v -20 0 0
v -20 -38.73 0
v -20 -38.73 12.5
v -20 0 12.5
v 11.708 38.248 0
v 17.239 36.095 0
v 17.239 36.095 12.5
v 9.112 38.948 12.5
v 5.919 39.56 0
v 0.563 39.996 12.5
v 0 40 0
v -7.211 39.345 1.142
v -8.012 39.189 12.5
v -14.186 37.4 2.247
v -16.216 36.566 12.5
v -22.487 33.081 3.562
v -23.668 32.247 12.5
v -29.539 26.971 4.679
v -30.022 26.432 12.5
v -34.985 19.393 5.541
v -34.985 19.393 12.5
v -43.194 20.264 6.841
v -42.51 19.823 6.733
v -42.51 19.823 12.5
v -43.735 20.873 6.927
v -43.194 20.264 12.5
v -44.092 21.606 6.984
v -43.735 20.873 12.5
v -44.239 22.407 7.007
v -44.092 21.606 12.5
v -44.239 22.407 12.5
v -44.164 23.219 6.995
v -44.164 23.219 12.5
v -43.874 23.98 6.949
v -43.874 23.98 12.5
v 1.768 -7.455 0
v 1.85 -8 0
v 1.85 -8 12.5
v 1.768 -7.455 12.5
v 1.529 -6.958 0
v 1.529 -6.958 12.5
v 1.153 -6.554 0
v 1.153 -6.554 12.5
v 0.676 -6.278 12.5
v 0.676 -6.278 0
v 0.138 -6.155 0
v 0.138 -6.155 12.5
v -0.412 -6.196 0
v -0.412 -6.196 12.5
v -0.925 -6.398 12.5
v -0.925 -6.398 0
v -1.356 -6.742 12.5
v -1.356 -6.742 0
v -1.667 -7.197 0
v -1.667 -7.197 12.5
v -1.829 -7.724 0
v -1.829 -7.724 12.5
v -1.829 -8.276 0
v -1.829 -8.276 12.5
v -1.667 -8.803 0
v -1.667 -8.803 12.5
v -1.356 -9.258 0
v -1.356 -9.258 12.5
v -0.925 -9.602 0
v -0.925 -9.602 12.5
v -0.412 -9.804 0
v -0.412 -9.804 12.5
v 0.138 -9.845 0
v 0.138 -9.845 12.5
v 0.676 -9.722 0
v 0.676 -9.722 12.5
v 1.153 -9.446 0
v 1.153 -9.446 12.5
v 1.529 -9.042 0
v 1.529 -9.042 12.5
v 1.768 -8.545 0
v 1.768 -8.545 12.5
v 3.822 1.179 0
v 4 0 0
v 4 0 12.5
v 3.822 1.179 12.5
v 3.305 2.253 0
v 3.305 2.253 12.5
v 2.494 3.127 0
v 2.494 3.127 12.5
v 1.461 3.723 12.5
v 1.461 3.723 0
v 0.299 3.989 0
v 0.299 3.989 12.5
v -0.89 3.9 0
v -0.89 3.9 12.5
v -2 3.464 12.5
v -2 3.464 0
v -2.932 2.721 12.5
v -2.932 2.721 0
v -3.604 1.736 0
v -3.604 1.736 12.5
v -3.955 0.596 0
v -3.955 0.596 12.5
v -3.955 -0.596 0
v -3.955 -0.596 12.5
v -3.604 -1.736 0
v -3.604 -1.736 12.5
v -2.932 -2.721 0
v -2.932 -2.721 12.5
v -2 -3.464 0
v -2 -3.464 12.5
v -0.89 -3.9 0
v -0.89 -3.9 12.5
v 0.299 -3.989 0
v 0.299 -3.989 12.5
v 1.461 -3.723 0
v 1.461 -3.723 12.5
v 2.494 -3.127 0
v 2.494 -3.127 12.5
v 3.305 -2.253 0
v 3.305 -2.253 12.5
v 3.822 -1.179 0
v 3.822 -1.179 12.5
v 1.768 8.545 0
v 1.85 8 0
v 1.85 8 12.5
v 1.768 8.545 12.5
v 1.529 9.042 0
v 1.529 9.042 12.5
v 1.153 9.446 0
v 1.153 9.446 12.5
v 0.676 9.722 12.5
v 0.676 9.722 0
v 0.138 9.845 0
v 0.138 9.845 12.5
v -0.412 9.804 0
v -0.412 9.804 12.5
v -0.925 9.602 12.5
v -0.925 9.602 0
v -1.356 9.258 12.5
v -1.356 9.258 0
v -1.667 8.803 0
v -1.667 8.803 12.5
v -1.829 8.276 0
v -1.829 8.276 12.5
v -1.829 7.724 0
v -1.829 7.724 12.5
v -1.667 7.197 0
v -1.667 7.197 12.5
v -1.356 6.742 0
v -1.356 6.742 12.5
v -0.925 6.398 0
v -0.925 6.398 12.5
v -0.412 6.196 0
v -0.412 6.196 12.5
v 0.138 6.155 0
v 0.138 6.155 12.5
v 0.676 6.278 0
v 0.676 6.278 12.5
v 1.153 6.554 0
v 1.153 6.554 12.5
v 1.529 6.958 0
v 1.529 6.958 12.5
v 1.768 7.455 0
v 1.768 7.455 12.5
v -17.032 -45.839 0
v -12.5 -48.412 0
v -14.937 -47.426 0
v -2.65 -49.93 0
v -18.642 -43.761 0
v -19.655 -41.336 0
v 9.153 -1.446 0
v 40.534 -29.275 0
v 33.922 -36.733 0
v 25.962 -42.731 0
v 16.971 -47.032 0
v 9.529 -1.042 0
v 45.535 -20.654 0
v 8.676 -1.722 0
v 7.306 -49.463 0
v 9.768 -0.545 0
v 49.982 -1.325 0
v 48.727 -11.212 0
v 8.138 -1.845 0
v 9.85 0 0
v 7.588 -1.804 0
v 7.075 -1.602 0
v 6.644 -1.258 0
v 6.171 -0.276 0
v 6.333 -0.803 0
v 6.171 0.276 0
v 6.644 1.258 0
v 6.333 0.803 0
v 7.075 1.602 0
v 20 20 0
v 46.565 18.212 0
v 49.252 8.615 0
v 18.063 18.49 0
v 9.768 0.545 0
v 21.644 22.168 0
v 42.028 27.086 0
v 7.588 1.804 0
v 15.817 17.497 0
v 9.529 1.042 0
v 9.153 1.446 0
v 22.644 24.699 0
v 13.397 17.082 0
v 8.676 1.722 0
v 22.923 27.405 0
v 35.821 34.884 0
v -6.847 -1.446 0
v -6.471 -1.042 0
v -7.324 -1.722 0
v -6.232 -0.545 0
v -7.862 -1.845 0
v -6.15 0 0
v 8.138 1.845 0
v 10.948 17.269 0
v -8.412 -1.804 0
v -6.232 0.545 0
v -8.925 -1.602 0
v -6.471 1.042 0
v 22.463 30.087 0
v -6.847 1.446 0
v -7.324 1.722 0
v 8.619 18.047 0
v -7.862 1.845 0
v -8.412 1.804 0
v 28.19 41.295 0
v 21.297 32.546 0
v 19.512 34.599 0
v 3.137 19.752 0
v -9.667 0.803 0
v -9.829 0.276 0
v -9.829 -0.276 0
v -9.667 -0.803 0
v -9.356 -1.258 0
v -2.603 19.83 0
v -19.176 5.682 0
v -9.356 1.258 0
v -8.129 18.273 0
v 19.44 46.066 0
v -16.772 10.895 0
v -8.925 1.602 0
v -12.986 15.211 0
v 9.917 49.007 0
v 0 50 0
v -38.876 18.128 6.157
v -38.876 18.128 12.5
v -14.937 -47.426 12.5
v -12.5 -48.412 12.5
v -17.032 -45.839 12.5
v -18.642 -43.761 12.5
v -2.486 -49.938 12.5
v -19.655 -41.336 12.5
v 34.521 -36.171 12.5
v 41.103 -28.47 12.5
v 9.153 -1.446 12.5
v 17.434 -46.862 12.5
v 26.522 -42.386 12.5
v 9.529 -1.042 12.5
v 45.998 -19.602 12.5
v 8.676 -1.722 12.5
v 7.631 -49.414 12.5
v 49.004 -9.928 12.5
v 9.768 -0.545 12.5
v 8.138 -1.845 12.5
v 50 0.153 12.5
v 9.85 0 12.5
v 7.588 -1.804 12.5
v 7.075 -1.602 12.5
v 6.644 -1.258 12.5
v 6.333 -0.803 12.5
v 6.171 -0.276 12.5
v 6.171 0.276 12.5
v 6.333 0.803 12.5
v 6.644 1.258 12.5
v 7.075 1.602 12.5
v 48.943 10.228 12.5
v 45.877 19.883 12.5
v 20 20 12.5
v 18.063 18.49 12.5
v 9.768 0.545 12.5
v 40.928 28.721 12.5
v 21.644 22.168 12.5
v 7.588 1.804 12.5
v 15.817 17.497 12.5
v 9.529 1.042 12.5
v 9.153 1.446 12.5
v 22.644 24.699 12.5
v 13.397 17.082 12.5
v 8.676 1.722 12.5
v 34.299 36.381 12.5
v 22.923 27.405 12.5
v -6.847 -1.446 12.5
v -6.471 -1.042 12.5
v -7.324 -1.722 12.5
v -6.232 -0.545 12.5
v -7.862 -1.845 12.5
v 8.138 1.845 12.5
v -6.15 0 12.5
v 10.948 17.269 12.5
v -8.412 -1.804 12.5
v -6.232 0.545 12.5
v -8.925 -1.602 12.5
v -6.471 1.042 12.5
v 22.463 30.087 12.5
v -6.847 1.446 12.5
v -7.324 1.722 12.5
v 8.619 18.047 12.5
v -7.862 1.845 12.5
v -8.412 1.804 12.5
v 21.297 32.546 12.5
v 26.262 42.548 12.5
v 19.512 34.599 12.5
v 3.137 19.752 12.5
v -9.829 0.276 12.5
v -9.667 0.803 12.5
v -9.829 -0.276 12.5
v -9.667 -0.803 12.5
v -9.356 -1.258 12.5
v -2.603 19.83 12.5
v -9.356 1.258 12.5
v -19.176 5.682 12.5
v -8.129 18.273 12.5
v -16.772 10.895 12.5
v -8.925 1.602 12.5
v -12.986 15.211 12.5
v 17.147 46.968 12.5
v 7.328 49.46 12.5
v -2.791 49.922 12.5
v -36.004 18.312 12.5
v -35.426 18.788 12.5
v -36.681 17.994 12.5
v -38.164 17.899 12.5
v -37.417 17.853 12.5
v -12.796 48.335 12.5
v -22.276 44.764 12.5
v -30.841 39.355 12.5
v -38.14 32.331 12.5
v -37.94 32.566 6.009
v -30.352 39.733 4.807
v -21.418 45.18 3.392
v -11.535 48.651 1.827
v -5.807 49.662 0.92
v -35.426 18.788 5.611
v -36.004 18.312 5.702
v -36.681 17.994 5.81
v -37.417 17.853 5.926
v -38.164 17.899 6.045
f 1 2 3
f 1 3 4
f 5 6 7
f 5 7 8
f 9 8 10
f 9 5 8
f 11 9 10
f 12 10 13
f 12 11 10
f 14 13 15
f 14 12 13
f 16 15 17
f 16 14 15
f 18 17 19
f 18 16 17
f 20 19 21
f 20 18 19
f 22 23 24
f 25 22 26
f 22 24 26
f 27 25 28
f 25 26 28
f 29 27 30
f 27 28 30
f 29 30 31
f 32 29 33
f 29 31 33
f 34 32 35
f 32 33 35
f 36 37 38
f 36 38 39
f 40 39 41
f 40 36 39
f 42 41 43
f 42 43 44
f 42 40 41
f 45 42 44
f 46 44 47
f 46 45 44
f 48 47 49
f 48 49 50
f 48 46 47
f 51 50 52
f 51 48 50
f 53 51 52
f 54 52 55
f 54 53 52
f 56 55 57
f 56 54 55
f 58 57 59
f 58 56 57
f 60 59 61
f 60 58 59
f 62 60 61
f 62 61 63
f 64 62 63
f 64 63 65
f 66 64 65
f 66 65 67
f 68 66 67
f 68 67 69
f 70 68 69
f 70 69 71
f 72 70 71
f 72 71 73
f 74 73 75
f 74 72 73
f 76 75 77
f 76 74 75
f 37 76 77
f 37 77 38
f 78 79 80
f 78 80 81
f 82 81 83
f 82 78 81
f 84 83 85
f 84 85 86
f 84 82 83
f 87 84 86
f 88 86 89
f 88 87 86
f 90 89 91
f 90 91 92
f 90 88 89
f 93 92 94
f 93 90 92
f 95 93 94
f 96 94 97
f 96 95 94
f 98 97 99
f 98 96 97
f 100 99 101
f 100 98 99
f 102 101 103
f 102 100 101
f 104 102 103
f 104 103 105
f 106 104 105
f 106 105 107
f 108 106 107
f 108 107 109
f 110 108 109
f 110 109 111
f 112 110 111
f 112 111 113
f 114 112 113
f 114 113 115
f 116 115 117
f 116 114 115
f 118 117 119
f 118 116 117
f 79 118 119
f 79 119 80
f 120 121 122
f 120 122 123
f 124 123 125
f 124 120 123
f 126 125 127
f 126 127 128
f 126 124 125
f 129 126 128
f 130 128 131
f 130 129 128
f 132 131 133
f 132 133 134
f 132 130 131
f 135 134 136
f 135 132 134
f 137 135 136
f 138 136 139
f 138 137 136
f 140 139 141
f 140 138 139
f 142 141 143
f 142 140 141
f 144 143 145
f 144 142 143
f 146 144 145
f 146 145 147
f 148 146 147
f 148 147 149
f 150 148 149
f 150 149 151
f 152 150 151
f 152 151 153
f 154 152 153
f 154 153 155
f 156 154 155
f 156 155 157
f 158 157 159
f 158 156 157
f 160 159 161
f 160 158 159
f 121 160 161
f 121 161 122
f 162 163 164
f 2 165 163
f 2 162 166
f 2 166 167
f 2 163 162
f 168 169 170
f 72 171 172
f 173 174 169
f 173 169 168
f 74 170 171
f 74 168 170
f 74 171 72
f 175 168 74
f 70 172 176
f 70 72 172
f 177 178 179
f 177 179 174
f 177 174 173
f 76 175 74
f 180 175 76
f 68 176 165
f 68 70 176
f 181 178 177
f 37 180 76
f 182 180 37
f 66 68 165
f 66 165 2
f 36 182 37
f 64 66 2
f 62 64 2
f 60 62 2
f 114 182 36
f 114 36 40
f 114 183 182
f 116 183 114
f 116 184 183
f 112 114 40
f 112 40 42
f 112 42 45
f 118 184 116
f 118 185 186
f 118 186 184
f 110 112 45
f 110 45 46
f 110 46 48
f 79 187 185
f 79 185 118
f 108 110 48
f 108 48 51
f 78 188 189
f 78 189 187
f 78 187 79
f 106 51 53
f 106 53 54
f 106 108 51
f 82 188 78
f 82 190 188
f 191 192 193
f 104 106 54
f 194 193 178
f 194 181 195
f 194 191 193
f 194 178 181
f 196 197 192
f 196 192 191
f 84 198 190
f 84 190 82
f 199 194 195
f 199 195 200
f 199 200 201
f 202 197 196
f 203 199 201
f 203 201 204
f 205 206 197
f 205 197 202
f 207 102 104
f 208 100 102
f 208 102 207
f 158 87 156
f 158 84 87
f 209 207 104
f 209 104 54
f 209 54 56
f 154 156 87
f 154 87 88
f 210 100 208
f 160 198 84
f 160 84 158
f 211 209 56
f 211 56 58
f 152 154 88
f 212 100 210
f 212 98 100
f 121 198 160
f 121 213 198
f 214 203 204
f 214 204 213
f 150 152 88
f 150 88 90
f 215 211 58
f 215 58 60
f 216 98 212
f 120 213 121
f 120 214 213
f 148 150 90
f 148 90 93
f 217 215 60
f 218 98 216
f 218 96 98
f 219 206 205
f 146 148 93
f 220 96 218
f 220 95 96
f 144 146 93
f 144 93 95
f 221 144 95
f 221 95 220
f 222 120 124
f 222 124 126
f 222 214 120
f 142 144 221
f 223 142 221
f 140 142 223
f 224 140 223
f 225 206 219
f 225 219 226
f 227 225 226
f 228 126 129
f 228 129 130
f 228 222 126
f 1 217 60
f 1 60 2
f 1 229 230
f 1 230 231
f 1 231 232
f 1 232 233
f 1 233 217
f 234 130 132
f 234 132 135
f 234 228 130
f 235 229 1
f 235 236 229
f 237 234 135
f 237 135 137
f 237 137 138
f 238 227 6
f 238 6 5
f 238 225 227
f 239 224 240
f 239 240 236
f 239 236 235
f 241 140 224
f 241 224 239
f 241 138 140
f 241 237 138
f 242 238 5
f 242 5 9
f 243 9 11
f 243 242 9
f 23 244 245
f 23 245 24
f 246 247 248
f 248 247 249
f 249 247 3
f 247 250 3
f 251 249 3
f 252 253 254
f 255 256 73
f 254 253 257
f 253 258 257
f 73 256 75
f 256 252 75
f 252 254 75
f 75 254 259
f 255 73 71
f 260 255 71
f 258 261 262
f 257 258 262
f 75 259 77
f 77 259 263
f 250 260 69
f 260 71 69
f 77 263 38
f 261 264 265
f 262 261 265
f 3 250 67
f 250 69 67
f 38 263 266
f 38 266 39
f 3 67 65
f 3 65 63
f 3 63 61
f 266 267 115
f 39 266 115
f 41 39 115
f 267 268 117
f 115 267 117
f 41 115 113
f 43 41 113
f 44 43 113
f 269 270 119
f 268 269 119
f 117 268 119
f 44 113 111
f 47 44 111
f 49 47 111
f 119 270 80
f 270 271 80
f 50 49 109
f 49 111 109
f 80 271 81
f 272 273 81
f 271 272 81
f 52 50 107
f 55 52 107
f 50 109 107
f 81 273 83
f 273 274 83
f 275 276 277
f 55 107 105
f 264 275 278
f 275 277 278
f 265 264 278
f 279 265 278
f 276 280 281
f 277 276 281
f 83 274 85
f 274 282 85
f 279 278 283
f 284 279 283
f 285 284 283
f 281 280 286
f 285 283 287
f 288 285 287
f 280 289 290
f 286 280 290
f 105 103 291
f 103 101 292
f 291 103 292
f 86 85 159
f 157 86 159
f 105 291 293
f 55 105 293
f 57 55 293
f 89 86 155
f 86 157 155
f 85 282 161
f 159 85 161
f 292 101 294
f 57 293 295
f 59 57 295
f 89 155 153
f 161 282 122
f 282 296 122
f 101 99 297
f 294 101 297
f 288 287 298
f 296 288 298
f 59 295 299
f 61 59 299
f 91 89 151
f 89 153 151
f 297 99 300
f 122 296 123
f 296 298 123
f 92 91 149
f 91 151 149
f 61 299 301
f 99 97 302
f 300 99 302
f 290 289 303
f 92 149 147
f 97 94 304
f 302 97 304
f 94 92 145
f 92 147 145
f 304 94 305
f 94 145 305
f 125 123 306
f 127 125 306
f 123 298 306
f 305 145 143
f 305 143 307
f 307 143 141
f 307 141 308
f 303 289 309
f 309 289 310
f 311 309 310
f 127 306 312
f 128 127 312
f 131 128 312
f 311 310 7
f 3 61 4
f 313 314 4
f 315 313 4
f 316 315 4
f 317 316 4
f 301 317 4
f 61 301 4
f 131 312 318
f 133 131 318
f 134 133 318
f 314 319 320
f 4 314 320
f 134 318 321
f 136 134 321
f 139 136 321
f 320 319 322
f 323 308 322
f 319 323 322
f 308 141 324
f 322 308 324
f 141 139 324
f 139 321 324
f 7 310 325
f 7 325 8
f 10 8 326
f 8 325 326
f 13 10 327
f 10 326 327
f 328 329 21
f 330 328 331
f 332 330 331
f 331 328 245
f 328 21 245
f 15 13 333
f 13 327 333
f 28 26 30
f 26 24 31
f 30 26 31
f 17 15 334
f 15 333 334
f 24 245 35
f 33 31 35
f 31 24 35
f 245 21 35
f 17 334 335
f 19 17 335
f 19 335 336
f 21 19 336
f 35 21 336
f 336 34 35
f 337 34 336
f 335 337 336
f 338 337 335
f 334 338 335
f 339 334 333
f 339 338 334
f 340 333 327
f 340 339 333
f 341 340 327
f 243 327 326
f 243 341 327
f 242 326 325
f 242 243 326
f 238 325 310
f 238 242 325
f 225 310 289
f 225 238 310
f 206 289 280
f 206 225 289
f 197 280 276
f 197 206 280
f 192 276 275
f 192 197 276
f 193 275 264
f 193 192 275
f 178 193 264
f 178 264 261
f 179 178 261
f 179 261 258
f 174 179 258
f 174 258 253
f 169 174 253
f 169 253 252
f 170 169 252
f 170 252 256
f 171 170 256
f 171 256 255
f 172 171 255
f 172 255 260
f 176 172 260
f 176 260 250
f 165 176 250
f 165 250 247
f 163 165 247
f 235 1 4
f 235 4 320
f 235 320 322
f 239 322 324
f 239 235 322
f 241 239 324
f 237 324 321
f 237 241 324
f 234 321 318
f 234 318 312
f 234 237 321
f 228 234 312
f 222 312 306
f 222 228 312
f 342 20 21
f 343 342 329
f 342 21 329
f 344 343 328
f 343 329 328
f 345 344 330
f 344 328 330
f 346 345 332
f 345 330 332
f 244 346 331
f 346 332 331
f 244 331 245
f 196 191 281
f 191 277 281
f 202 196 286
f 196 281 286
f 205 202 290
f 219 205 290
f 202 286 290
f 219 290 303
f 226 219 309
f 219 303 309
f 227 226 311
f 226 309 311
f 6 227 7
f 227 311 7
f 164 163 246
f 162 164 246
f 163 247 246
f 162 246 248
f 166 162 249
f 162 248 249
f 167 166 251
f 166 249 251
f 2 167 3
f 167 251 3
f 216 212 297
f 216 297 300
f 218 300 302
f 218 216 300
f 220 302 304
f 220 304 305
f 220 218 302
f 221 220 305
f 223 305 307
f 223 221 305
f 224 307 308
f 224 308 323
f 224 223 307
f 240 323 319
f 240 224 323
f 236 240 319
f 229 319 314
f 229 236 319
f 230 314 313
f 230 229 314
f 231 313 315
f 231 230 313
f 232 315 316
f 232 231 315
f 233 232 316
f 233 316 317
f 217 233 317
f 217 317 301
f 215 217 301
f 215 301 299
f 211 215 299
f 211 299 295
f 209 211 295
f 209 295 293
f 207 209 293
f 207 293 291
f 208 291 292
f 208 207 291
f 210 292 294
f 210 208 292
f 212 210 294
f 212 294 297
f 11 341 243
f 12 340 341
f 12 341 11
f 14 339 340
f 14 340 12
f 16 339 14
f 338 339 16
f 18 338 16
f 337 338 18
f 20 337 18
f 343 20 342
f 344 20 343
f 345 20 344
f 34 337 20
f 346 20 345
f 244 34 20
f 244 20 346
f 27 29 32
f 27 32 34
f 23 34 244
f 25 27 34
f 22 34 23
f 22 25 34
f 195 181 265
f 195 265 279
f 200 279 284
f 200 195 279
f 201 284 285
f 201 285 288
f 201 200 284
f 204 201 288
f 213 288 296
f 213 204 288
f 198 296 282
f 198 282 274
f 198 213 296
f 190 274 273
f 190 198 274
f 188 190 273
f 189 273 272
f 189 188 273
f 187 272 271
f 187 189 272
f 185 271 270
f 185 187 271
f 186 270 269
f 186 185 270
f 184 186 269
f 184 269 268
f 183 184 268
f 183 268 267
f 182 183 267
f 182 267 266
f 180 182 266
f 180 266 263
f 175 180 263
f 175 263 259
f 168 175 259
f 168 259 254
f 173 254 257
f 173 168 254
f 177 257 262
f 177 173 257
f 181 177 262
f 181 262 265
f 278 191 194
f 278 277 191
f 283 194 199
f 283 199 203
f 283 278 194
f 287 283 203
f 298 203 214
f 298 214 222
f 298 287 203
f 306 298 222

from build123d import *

# Parameters (mm, degrees)
SKETCH1_R           = 4
SKETCH1_R_2         = 1.85
BOSS_EXTRUDE1_DEPTH = 12.5
FILLET1_R           = 10
FILLET2_R           = 3
FILLET3_R           = 10
CUT_EXTRUDE1_DEPTH  = 20


with BuildPart() as part:
    # Sketch1 → Boss-Extrude1 (new body)
    with BuildSketch(Plane.XY):
        with BuildLine():
            Line((14.142135624, 14.142135624), (28.284271247, 28.284271247))
            ThreePointArc((28.284271247, 28.284271247), (-6.945927107, 39.39231012), (-36.252311481, 16.90473047))
            Line((-36.252311481, 16.90473047), (-45.315389352, 21.130913087))
            ThreePointArc((-45.315389352, 21.130913087), (46.768835106, 17.682648638), (-20, -45.82575695))
            Line((-20, -45.82575695), (-20, 0))
            ThreePointArc((-20, 0), (-7.653668647, 18.47759065), (14.142135624, 14.142135624))
        make_face()
        Circle(SKETCH1_R, mode=Mode.SUBTRACT)
        with Locations((0, 8)):
            Circle(SKETCH1_R_2, mode=Mode.SUBTRACT)
        with Locations((8, 0)):
            Circle(SKETCH1_R_2, mode=Mode.SUBTRACT)
        with Locations((0, -8)):
            Circle(SKETCH1_R_2, mode=Mode.SUBTRACT)
        with Locations((-8, 0)):
            Circle(SKETCH1_R_2, mode=Mode.SUBTRACT)
    extrude(amount=BOSS_EXTRUDE1_DEPTH)

    # Fillet1
    fillet1_edges = [part.edges().sort_by_distance(p)[0] for p in [
        (28.284271247, 28.284271247, 6.25),
        (14.142135624, 14.142135624, 6.25),
    ]]
    fillet(fillet1_edges, radius=FILLET1_R - 0.0001)  # a hair under: the kernel refuses the full size

    # Fillet2
    fillet2_edges = [part.edges().sort_by_distance(p)[0] for p in [
        (-36.252311481, 16.90473047, 6.25),
        (-45.315389352, 21.130913087, 6.25),
    ]]
    fillet(fillet2_edges, radius=FILLET2_R)

    # Fillet3
    fillet3_edges = [part.edges().sort_by_distance(p)[0] for p in [
        (-20, -45.82575695, 6.25),
    ]]
    fillet(fillet3_edges, radius=FILLET3_R)

    # Sketch3 → Cut-Extrude1 (cut)
    with BuildSketch(Plane(origin=(0, 0, 0), x_dir=(0, -1, 0), z_dir=(-0.1564344650402244, 0, -0.9876883405951388))):
        Polygon((-59.412445721, 3.059679317), (-37.456599692, -8.541700414), (-10.399971435, 42.663516366), (-32.355817465, 54.264896097), align=None)
    extrude(amount=CUT_EXTRUDE1_DEPTH, mode=Mode.SUBTRACT)


solid = part.part
